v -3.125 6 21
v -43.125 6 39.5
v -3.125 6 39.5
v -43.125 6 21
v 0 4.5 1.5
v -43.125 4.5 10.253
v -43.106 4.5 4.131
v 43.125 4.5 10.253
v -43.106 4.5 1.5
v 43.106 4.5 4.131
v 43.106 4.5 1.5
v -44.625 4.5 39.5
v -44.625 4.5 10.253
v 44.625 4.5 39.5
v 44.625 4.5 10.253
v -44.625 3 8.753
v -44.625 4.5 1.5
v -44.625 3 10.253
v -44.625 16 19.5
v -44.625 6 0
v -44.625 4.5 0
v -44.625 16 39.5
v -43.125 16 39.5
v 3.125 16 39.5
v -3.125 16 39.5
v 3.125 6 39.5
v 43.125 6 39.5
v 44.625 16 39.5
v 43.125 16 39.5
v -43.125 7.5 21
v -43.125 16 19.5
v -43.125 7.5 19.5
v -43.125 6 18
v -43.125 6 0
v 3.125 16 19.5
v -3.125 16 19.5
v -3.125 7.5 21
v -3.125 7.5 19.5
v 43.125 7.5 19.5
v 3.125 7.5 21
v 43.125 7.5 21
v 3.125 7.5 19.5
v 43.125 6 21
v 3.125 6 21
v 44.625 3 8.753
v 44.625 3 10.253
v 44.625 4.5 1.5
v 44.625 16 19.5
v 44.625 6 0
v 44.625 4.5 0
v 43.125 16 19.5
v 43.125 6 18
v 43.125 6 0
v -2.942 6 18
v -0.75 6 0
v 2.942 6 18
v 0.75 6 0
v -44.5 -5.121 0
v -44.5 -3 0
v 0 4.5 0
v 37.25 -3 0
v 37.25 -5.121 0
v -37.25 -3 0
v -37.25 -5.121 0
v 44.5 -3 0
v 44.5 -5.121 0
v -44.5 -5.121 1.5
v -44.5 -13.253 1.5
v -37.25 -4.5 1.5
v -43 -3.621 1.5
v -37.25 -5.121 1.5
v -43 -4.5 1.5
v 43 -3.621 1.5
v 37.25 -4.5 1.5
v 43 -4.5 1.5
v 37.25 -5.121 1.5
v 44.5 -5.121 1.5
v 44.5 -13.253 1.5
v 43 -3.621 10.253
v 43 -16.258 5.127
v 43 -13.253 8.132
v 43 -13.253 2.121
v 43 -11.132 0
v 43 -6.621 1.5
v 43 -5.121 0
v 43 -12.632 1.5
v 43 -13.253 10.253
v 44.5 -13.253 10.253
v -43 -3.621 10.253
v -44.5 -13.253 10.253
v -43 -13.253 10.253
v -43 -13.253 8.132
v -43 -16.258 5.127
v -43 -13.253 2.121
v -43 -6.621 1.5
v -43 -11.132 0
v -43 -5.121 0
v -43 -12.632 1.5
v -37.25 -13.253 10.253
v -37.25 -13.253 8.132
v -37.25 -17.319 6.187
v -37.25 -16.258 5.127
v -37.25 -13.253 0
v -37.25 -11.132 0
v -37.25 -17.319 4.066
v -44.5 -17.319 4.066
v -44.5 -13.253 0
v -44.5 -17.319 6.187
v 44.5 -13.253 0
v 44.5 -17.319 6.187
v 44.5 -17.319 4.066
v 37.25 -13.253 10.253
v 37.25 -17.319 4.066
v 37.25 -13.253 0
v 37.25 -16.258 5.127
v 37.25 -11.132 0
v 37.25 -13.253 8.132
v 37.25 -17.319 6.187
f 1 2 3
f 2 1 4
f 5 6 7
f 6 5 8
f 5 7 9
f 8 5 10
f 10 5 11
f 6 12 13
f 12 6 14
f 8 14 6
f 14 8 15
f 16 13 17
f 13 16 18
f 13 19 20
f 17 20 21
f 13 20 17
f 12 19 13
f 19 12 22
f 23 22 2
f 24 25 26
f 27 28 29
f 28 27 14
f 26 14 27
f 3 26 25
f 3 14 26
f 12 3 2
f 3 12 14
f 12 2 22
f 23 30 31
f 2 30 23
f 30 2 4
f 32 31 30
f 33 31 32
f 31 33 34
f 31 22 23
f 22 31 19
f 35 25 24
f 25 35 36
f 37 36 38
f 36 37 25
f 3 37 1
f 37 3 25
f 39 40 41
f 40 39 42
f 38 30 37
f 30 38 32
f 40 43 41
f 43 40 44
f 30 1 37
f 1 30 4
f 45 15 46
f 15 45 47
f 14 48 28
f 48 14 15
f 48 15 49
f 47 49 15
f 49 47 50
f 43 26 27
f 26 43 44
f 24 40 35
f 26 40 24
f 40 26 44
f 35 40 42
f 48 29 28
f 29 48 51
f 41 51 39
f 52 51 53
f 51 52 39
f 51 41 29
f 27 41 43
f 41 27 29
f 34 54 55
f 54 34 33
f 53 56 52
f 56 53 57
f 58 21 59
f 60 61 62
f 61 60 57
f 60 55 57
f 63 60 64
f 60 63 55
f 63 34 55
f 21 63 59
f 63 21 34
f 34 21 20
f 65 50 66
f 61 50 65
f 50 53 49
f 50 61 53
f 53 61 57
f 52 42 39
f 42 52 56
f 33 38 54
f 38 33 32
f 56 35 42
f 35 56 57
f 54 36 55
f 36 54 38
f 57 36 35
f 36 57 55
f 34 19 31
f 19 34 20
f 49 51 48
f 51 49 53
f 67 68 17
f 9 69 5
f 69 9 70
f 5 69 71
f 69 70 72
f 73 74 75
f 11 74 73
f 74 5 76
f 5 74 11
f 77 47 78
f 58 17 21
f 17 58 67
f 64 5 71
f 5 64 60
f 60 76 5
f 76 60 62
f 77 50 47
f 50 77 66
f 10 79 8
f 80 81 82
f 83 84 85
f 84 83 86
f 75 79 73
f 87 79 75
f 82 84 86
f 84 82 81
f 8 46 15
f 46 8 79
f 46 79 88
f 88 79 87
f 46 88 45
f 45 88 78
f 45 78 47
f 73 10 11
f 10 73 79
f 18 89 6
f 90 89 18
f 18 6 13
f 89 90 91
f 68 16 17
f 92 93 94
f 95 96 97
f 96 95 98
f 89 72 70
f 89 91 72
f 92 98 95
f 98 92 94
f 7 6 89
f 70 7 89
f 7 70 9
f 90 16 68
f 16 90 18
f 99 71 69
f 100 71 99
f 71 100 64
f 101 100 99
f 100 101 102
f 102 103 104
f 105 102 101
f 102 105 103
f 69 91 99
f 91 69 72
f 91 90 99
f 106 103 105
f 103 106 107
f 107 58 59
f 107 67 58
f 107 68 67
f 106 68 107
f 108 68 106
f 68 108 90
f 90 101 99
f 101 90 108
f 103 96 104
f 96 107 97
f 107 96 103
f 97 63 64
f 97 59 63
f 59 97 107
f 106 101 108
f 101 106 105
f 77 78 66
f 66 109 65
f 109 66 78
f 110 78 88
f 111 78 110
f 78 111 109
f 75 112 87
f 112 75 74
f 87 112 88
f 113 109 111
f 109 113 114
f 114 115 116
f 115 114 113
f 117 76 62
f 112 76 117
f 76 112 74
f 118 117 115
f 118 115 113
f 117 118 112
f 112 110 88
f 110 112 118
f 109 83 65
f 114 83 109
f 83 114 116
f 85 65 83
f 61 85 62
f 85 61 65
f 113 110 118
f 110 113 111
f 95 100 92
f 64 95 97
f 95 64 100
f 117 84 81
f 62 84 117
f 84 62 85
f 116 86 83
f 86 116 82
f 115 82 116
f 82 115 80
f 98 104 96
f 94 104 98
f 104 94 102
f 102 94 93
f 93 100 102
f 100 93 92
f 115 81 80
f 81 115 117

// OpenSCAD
// Mirror mount
// Mount a mirror to the dual extruder of a CTC Dual
// author: Benedict Endemann
// https://www.thingiverse.com/thing:3037001

////////// Thingiverse Customizer //////////
mirror_width     = 61;
mirror_height    = 4.25;
mirror_lenght    = 86;
////////// Thingiverse Customizer //////////

mirrormount(
    mirror_width     = mirror_width,   // 61
    mirror_height    = mirror_height, // 4.25
    mirror_lenght    = mirror_lenght,   // 86
    fan_size         = 40,   // 40
    fan_height       = 20,   // 20
    gap_between_fans = 6.25, // 6.25
    gap_before_fans  = 18,   // 18
    gap_under_fans   = 9,    // 9
    thickness        = 1.5   // 1.5
);

module mirrormount(
    mirror_width,
    mirror_height,
    mirror_lenght,
    fan_size,
    fan_height,
    gap_between_fans,
    gap_before_fans,
    gap_under_fans,
    thickness
) {

    fan_holders_total_width = thickness + fan_size + gap_between_fans + fan_size + thickness;
    mirror_holder_width     = thickness + mirror_lenght + thickness;
    holder_size             = thickness + mirror_height + thickness;

    // rotate and translate for print
    rotate([-90, 0, 0]) translate([0, -fan_height - gap_before_fans - thickness, gap_under_fans / 2])

    union() {

        // left fan holder
        translate([-gap_between_fans / 2 - fan_size - thickness, 0, 0])
            fan_holder(
                fan_size,
                fan_height,
                thickness
            );

        // fan holder connection
        translate([-gap_between_fans / 2, 0, 0])
            cube([gap_between_fans, fan_height, thickness + fan_size / 4]);

        // right fan holder
        translate([gap_between_fans / 2 - thickness, 0, 0])
            fan_holder(
                fan_size,
                fan_height,
                thickness
            );

        // spacer before fans
        union() {

            translate([-fan_holders_total_width / 2, fan_height - thickness, 0])
                cube([fan_holders_total_width, thickness + gap_before_fans + thickness, thickness]);


            hull() {

                translate([-fan_holders_total_width / 2, fan_height - thickness, 0])
                    cube([fan_holders_total_width, thickness + thickness, thickness]);

                translate([-fan_holders_total_width / 2, fan_height - thickness, thickness])
                    cube([fan_holders_total_width, thickness, thickness]);

            }

            hull() {

                translate([-gap_between_fans / 2, fan_height - thickness, 0])
                    cube([gap_between_fans, thickness, thickness + fan_size / 4]);

                translate([-thickness / 2, fan_height + gap_before_fans, 0])
                    cube([thickness, thickness, thickness]);

            }

            hull() {

                translate([-fan_holders_total_width / 2, fan_height - thickness, 0])
                    cube([thickness, thickness, thickness + fan_size / 4]);

                translate([-fan_holders_total_width / 2, fan_height + gap_before_fans, 0])
                    cube([thickness, thickness, thickness]);

            }

            hull() {

                translate([fan_holders_total_width / 2 - thickness, fan_height - thickness, 0])
                    cube([thickness, thickness, thickness + fan_size / 4]);

                translate([fan_holders_total_width / 2 - thickness, fan_height + gap_before_fans, 0])
                    cube([thickness, thickness, thickness]);

            }
        }

        // fan mirror connection
        union () {

            hull() {

                translate([-fan_holders_total_width / 2, fan_height + gap_before_fans, 0])
                    cube([fan_holders_total_width / 2, thickness, thickness]);

                translate([
                    -mirror_holder_width / 2,
                    fan_height + gap_before_fans,
                    -gap_under_fans - pyth(thickness, thickness) + thickness
                ])
                    cube([holder_size, thickness, thickness]);

            }

            hull() {

                translate([0, fan_height + gap_before_fans, 0])
                    cube([fan_holders_total_width / 2, thickness, thickness]);

                translate([
                    mirror_holder_width / 2 - holder_size,
                    fan_height + gap_before_fans,
                    -gap_under_fans - pyth(thickness, thickness) + thickness
                ])
                    cube([holder_size, thickness, thickness]);

            }

            hull() {

                translate([
                    fan_holders_total_width / 2 - thickness,
                    fan_height + gap_before_fans - pyth(holder_size, holder_size) + thickness,
                    -thickness
                ])
                    cube([thickness, thickness, thickness]);

                translate([
                    fan_holders_total_width / 2 - thickness,
                    fan_height + gap_before_fans - thickness,
                    0
                ])
                    cube([thickness, thickness, thickness]);

                translate([
                    mirror_holder_width / 2 - thickness,
                    fan_height + gap_before_fans - pyth(holder_size, holder_size) + thickness,
                    -gap_under_fans - pyth(thickness, thickness) + thickness
                ])
                    cube([thickness, pyth(holder_size, holder_size) - thickness, thickness]);

                translate([
                    mirror_holder_width / 2 - thickness,
                    fan_height + gap_before_fans - pyth(holder_size, holder_size) + thickness,
                    -gap_under_fans - pyth(holder_size, holder_size) + thickness
                ])
                    cube([thickness, pyth(holder_size, holder_size) - thickness, thickness]);
            }

            hull() {

                translate([
                    -fan_holders_total_width / 2,
                    fan_height + gap_before_fans - pyth(holder_size, holder_size) + thickness,
                    -thickness
                ])
                    cube([thickness, thickness, thickness]);

                translate([
                    -fan_holders_total_width / 2,
                    fan_height + gap_before_fans - thickness,
                    0
                ])
                    cube([thickness, thickness, thickness]);

                translate([
                    -mirror_holder_width / 2,
                    fan_height + gap_before_fans - pyth(holder_size, holder_size) + thickness,
                    -gap_under_fans - pyth(thickness, thickness) + thickness
                ])
                    cube([thickness, pyth(holder_size, holder_size) - thickness, thickness]);

                translate([
                    -mirror_holder_width / 2,
                    fan_height + gap_before_fans - pyth(holder_size, holder_size) + thickness,
                    -gap_under_fans - pyth(holder_size, holder_size) + thickness
                ])
                    cube([thickness, pyth(holder_size, holder_size) - thickness, thickness]);
            }
        }

        // mirror holder
        translate([
            -mirror_holder_width / 2,
            fan_height + gap_before_fans - pyth(holder_size, holder_size) / 2 + thickness,
            -gap_under_fans - (pyth(holder_size, holder_size) + pyth(holder_size - thickness, holder_size - thickness) / 2) + (thickness - pyth(thickness, thickness) / 2)
        ])
            rotate([45, 0, 0])
                mirror_holder(
                    mirror_lenght,
                    mirror_width,
                    mirror_height,
                    holder_size,
                    thickness
                );

    }
}

function pyth(a,b) = sqrt(a * a + b * b);

module fan_holder(
    fan_size,
    fan_height,
    thickness
) {

    union() {

        // base plate
        cube([
            thickness + fan_size + thickness,
            fan_height,
            thickness
        ]);

        // right plate
        cube([
            thickness,
            fan_height,
            thickness + fan_size / 4
        ]);

        // left plate
        translate([thickness + fan_size ,0 ,0])
            cube([
                thickness,
                fan_height,
                thickness + fan_size / 4
            ]);

        // back plate
        translate([0, fan_height - thickness, 0])
            cube([
                thickness + fan_size + thickness,
                thickness,
                thickness + thickness
            ]);

    }

}

module mirror_holder(
    mirror_lenght,
    mirror_width,
    mirror_height,
    holder_size,
    thickness
) {

    difference() {

        // mirror holder
        union() {

            // left part
            difference() {

                cube([
                    holder_size,
                    2 * holder_size,
                    holder_size
                ]);

                translate([-holder_size / 2, 2 * holder_size, -holder_size])
                    rotate([45, 0, 0])
                        cube([
                            2 * holder_size,
                            pyth(holder_size, holder_size),
                            pyth(holder_size, holder_size)
                        ]);

                translate([-holder_size / 2, 0, -thickness])
                    rotate([45, 0, 0])
                        cube([
                            2 * holder_size,
                            pyth(thickness, thickness),
                            pyth(thickness, thickness)
                        ]);
            }

            // right right
            translate([mirror_lenght - mirror_height, 0, 0])
                difference() {

                    cube([
                        holder_size,
                        2 * holder_size,
                        holder_size
                    ]);

                    translate([-holder_size / 2, 2 * holder_size, -holder_size])
                        rotate([45, 0, 0])
                            cube([
                                2 * holder_size,
                                pyth(holder_size, holder_size),
                                pyth(holder_size, holder_size)
                            ]);

                    translate([-holder_size / 2, 0, -thickness])
                        rotate([45, 0, 0])
                            cube([
                                2 * holder_size,
                                pyth(thickness, thickness),
                                pyth(thickness, thickness)
                            ]);
                }
        }

        // mirror
        translate([thickness, thickness, thickness])
            #cube([mirror_lenght, mirror_width, mirror_height]);


    }
}
